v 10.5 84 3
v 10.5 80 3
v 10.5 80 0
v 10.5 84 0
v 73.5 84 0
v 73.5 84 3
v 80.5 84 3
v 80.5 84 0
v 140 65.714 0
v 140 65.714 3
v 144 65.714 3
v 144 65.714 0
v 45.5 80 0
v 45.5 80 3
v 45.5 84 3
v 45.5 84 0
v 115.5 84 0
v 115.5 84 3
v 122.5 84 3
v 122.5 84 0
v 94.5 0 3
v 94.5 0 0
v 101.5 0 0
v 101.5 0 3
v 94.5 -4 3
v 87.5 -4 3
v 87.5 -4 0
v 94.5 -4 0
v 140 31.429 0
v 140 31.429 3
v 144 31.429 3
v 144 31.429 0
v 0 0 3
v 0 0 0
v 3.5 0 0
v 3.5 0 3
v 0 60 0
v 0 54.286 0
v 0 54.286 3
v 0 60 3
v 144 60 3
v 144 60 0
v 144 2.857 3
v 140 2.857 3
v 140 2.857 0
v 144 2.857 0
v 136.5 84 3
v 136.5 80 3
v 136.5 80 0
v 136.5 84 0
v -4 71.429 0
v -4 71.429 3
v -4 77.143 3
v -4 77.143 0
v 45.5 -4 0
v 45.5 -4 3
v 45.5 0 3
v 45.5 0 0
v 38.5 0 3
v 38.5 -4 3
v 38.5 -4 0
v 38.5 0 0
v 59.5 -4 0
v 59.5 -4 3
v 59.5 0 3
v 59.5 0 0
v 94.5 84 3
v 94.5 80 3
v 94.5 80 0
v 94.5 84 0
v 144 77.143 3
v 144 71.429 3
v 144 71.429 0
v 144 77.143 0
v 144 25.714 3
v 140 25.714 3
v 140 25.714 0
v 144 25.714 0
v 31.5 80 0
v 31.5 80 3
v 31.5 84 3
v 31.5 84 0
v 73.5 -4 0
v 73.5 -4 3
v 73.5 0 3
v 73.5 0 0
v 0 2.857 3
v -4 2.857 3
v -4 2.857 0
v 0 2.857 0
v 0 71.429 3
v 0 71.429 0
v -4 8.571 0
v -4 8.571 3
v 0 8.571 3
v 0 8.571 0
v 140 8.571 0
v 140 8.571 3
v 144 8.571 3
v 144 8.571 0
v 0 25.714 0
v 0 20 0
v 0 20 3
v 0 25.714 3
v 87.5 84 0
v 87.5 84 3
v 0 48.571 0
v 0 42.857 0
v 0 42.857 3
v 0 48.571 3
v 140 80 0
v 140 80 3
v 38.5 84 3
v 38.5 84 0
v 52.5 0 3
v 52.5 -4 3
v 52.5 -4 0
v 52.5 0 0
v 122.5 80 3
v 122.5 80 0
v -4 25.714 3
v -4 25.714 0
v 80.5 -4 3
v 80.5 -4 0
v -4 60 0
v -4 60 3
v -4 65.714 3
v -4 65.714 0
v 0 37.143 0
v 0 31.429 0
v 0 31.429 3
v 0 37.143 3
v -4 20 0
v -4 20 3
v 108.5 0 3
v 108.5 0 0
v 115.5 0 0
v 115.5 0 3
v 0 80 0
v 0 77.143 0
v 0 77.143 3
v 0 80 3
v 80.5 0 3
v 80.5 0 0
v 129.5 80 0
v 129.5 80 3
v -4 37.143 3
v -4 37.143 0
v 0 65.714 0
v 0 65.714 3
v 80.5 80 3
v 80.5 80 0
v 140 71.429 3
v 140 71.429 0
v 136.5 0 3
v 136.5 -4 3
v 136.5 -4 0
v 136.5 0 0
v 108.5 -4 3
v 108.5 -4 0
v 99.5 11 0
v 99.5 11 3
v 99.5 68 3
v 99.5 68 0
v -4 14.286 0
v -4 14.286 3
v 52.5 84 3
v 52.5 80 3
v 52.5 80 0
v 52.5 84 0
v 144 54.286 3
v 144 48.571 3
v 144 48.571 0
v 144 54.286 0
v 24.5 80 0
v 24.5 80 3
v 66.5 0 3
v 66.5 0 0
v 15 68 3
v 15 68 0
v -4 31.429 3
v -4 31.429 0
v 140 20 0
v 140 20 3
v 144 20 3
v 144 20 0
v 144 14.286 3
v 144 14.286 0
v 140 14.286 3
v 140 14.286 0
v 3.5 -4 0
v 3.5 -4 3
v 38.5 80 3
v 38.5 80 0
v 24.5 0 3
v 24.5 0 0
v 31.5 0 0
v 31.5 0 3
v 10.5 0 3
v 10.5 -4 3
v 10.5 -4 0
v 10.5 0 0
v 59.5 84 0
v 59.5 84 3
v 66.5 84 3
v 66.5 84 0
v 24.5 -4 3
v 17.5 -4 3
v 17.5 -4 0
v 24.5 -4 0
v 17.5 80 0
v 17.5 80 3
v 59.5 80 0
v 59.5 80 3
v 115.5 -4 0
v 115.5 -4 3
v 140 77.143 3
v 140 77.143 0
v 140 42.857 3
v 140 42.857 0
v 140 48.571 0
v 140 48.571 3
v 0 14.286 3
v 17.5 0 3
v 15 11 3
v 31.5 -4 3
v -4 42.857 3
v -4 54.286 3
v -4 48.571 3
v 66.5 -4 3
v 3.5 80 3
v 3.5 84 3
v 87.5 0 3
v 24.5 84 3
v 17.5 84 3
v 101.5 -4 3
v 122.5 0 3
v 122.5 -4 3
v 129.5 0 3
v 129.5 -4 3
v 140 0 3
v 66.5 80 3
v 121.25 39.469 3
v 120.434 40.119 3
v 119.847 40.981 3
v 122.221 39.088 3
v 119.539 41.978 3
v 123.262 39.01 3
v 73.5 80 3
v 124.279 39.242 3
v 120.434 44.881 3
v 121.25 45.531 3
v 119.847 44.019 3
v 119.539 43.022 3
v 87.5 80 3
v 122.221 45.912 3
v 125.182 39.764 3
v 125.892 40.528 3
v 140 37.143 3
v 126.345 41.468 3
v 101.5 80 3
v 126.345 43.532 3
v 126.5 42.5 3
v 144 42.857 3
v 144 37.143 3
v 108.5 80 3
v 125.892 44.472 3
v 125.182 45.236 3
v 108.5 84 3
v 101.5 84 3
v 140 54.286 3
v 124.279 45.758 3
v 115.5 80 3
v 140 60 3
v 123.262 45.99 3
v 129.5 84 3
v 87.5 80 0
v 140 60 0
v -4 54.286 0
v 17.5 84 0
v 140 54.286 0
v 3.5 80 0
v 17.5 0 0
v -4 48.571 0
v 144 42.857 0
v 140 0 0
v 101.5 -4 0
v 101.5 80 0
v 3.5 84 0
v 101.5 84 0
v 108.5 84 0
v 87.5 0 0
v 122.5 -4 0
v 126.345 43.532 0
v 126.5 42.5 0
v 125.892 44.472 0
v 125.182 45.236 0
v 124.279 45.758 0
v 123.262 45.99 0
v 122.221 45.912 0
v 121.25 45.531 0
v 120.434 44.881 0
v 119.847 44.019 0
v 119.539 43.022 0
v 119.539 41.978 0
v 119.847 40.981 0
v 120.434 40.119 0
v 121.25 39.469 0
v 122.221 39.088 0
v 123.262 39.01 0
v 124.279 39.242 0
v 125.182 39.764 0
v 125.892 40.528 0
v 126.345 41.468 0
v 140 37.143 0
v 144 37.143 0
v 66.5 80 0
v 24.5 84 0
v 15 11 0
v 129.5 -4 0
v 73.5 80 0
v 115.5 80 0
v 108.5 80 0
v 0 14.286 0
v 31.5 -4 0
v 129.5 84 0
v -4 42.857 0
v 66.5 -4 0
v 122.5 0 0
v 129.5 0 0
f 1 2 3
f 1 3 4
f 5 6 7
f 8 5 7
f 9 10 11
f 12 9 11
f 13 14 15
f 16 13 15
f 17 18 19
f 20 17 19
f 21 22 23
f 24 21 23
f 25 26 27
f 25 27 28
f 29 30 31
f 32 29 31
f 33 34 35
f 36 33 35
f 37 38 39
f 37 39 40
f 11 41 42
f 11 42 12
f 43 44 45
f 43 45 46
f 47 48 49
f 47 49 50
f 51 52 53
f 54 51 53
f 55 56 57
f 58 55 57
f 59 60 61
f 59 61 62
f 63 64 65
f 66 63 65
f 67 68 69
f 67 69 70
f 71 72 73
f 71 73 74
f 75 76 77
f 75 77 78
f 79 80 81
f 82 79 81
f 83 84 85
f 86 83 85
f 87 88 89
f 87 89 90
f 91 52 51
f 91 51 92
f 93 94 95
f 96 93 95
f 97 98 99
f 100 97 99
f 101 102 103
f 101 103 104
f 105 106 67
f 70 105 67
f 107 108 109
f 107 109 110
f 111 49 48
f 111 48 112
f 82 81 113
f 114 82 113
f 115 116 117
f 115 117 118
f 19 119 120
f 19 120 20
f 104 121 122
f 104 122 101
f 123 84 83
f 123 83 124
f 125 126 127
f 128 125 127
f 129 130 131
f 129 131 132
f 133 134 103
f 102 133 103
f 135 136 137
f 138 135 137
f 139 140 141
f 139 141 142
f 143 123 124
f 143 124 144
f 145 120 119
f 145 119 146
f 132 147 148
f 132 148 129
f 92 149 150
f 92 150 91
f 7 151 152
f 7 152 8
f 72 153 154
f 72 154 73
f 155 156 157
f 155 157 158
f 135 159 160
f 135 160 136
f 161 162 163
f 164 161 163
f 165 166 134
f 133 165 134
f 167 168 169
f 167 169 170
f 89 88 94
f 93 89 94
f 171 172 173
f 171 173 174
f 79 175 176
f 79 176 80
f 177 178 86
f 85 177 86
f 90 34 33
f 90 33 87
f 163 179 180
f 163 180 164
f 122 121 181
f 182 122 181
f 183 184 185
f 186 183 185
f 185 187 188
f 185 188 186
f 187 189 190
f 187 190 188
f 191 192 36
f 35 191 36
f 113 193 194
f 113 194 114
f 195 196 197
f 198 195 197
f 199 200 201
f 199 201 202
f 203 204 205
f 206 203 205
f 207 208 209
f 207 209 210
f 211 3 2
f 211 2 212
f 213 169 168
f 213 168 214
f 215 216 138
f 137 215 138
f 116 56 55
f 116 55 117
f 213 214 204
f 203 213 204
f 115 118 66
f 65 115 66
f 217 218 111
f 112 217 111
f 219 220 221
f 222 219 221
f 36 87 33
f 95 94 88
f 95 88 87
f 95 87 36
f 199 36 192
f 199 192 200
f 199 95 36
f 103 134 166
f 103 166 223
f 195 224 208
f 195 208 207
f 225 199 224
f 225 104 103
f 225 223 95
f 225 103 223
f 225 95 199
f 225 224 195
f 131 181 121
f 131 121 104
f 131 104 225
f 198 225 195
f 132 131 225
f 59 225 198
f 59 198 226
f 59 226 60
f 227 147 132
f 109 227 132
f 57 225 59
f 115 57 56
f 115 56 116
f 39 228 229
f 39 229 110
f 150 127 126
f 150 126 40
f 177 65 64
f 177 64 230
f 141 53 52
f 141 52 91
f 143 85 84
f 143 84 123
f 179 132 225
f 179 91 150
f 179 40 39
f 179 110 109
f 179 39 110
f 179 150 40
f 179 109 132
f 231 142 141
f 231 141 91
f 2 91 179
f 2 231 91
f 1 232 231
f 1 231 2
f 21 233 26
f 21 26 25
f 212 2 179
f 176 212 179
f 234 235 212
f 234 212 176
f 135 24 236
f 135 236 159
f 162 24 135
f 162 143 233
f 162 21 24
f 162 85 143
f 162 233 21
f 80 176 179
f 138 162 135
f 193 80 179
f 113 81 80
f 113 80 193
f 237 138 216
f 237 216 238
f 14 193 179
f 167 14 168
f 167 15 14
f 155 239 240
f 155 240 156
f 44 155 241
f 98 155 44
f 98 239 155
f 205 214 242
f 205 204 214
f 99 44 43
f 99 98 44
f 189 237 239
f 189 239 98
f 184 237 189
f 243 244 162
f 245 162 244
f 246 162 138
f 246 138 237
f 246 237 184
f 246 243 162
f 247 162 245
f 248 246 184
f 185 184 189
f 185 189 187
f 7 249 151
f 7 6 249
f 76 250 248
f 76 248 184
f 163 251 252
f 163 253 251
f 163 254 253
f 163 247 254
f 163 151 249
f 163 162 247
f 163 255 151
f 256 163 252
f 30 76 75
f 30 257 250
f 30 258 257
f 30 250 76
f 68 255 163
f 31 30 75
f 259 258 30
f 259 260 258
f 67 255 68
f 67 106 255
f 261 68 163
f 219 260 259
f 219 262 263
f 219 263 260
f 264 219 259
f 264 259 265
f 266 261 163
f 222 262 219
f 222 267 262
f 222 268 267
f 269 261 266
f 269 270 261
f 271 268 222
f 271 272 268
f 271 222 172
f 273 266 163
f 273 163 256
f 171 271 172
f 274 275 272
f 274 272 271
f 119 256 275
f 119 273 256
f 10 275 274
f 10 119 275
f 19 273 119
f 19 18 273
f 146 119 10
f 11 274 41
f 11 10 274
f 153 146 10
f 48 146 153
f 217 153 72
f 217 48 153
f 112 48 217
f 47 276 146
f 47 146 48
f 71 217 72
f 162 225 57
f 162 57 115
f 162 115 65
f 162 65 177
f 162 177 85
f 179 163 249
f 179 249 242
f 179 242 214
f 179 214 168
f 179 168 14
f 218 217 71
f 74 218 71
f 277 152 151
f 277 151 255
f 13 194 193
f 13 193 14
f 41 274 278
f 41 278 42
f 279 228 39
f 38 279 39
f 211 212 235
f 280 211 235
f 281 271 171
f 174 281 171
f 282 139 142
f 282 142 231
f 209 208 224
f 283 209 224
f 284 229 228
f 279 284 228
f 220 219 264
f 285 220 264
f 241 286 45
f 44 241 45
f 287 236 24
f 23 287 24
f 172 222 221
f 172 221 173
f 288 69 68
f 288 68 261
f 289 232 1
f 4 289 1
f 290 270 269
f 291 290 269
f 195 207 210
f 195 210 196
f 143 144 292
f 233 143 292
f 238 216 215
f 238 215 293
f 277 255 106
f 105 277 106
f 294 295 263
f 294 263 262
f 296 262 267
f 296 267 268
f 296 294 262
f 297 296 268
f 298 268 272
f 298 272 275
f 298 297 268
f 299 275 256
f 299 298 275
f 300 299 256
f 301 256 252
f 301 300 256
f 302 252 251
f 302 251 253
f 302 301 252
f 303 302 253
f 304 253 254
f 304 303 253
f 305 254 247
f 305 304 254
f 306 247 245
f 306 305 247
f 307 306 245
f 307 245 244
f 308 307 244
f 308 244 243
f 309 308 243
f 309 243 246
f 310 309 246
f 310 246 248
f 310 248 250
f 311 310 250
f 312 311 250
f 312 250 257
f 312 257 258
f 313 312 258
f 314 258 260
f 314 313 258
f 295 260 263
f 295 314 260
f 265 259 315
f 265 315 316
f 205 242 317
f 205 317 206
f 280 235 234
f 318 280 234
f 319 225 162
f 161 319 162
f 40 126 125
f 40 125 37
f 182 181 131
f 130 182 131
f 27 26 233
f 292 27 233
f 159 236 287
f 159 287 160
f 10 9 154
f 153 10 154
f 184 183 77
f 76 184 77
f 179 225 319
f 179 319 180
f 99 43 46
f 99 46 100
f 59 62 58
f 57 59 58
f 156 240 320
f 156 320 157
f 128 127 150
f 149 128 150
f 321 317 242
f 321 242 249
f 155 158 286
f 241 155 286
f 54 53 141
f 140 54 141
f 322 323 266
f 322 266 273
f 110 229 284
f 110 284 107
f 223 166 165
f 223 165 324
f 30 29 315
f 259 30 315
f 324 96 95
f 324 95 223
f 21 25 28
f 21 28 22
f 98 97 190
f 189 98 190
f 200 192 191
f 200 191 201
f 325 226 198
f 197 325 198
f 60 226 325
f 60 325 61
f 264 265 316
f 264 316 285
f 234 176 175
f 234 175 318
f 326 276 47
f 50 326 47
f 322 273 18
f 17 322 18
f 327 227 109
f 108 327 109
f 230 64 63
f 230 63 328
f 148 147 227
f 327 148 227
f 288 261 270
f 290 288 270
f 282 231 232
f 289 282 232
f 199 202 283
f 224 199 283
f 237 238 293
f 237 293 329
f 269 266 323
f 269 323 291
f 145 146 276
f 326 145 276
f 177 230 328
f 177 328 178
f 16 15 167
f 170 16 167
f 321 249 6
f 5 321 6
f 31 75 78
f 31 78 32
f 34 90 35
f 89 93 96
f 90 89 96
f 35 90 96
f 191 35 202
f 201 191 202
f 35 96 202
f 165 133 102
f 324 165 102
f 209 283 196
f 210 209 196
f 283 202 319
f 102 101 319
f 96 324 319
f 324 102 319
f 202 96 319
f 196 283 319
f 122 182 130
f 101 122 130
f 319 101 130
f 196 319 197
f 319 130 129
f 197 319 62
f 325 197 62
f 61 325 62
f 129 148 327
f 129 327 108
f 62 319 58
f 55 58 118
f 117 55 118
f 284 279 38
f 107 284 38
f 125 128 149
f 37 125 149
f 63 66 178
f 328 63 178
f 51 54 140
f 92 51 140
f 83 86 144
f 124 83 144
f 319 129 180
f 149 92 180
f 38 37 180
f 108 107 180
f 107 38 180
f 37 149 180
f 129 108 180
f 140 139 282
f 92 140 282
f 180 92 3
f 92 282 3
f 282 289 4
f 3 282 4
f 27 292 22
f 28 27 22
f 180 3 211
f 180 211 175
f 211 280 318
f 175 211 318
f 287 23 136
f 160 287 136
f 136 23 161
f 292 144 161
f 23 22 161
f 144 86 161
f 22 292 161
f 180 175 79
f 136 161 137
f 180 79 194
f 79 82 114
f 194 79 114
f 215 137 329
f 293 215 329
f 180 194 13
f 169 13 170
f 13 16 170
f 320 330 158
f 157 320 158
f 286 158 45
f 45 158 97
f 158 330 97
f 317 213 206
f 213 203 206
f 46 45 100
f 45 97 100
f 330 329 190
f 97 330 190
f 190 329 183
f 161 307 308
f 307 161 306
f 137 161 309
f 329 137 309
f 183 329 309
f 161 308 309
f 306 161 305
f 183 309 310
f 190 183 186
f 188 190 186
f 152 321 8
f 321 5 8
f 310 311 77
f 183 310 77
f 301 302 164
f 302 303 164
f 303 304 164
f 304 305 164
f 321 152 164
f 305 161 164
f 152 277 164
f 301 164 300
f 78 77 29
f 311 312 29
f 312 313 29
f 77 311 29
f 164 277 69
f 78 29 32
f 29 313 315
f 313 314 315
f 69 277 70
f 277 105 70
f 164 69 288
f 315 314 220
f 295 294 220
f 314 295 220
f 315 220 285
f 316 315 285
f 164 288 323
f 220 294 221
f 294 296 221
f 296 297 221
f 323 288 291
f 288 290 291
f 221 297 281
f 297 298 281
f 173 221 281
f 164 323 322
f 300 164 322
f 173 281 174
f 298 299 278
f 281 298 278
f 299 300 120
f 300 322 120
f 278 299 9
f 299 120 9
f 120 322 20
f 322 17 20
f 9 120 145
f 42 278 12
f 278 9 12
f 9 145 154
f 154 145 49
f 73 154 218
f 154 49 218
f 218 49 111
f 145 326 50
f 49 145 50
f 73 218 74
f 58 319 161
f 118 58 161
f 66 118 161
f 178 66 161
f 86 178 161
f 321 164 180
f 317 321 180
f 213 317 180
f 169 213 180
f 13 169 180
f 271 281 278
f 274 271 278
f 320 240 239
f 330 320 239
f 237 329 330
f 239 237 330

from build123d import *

# Parameters (mm, degrees)
SCHIZZO1_W                   = 140
SCHIZZO1_H                   = 80
SCHIZZO1_R                   = 3.5
SCHIZZO1_W_2                 = 95
SCHIZZO1_H_2                 = 61
ESTRUSIONE_ESTRUSIONE1_DEPTH = 3
SCHIZZO2_W                   = 7
SCHIZZO2_H                   = 4
ESTRUSIONE_ESTRUSIONE2_DEPTH = 3
RIPETIZIONE_A_L1_COUNT       = 10
RIPETIZIONE_A_L1_PITCH       = 14
SCHIZZO3_W                   = 4
SCHIZZO3_H                   = 5.714285714
ESTRUSIONE_ESTRUSIONE3_DEPTH = 3
RIPETIZIONE_A_L2_COUNT       = 7
RIPETIZIONE_A_L2_PITCH       = 11.428571429
SCHIZZO4_W                   = 95
SCHIZZO4_H                   = 61
SCHIZZO4_W_2                 = 84.5
SCHIZZO4_H_2                 = 57
ESTRUSIONE_ESTRUSIONE4_DEPTH = 3


with BuildPart() as part:
    # Schizzo1 → Estrusione-Estrusione1 (new body)
    with BuildSketch(Plane.XY):
        with Locations((70, 40)):
            Rectangle(SCHIZZO1_W, SCHIZZO1_H)
        with Locations((123, 42.5)):
            Circle(SCHIZZO1_R, mode=Mode.SUBTRACT)
        with Locations((59.5, 39.5)):
            Rectangle(SCHIZZO1_W_2, SCHIZZO1_H_2, mode=Mode.SUBTRACT)
    extrude(amount=ESTRUSIONE_ESTRUSIONE1_DEPTH)

    # Schizzo2 → Estrusione-Estrusione2 (add)
    with BuildSketch(Plane.XY.offset(3)):
        with Locations((7, 82)):
            Rectangle(SCHIZZO2_W, SCHIZZO2_H)
        with Locations((7, -2)):
            Rectangle(SCHIZZO2_W, SCHIZZO2_H)
    estrusione_estrusione2 = extrude(amount=-ESTRUSIONE_ESTRUSIONE2_DEPTH)

    # Ripetizione a L1: Estrusione-Estrusione2 ×10
    with Locations(*[(i * RIPETIZIONE_A_L1_PITCH, 0, 0) for i in range(1, RIPETIZIONE_A_L1_COUNT)]):
        add(estrusione_estrusione2)

    # Schizzo3 → Estrusione-Estrusione3 (add)
    with BuildSketch(Plane.XY.offset(3)):
        with Locations((-2, 74.285714286)):
            Rectangle(SCHIZZO3_W, SCHIZZO3_H)
        with Locations((142, 74.285714286)):
            Rectangle(SCHIZZO3_W, SCHIZZO3_H)
    estrusione_estrusione3 = extrude(amount=-ESTRUSIONE_ESTRUSIONE3_DEPTH)

    # Ripetizione a L2: Estrusione-Estrusione3 ×7
    with Locations(*[(0, -i * RIPETIZIONE_A_L2_PITCH, 0) for i in range(1, RIPETIZIONE_A_L2_COUNT)]):
        add(estrusione_estrusione3)

    # Schizzo4 → Estrusione-Estrusione4 (add)
    with BuildSketch(Plane.XY.offset(3)):
        with Locations((59.5, 39.5)):
            Rectangle(SCHIZZO4_W, SCHIZZO4_H)
        with Locations((57.25, 39.5)):
            Rectangle(SCHIZZO4_W_2, SCHIZZO4_H_2, mode=Mode.SUBTRACT)
    extrude(amount=-ESTRUSIONE_ESTRUSIONE4_DEPTH)


solid = part.part
